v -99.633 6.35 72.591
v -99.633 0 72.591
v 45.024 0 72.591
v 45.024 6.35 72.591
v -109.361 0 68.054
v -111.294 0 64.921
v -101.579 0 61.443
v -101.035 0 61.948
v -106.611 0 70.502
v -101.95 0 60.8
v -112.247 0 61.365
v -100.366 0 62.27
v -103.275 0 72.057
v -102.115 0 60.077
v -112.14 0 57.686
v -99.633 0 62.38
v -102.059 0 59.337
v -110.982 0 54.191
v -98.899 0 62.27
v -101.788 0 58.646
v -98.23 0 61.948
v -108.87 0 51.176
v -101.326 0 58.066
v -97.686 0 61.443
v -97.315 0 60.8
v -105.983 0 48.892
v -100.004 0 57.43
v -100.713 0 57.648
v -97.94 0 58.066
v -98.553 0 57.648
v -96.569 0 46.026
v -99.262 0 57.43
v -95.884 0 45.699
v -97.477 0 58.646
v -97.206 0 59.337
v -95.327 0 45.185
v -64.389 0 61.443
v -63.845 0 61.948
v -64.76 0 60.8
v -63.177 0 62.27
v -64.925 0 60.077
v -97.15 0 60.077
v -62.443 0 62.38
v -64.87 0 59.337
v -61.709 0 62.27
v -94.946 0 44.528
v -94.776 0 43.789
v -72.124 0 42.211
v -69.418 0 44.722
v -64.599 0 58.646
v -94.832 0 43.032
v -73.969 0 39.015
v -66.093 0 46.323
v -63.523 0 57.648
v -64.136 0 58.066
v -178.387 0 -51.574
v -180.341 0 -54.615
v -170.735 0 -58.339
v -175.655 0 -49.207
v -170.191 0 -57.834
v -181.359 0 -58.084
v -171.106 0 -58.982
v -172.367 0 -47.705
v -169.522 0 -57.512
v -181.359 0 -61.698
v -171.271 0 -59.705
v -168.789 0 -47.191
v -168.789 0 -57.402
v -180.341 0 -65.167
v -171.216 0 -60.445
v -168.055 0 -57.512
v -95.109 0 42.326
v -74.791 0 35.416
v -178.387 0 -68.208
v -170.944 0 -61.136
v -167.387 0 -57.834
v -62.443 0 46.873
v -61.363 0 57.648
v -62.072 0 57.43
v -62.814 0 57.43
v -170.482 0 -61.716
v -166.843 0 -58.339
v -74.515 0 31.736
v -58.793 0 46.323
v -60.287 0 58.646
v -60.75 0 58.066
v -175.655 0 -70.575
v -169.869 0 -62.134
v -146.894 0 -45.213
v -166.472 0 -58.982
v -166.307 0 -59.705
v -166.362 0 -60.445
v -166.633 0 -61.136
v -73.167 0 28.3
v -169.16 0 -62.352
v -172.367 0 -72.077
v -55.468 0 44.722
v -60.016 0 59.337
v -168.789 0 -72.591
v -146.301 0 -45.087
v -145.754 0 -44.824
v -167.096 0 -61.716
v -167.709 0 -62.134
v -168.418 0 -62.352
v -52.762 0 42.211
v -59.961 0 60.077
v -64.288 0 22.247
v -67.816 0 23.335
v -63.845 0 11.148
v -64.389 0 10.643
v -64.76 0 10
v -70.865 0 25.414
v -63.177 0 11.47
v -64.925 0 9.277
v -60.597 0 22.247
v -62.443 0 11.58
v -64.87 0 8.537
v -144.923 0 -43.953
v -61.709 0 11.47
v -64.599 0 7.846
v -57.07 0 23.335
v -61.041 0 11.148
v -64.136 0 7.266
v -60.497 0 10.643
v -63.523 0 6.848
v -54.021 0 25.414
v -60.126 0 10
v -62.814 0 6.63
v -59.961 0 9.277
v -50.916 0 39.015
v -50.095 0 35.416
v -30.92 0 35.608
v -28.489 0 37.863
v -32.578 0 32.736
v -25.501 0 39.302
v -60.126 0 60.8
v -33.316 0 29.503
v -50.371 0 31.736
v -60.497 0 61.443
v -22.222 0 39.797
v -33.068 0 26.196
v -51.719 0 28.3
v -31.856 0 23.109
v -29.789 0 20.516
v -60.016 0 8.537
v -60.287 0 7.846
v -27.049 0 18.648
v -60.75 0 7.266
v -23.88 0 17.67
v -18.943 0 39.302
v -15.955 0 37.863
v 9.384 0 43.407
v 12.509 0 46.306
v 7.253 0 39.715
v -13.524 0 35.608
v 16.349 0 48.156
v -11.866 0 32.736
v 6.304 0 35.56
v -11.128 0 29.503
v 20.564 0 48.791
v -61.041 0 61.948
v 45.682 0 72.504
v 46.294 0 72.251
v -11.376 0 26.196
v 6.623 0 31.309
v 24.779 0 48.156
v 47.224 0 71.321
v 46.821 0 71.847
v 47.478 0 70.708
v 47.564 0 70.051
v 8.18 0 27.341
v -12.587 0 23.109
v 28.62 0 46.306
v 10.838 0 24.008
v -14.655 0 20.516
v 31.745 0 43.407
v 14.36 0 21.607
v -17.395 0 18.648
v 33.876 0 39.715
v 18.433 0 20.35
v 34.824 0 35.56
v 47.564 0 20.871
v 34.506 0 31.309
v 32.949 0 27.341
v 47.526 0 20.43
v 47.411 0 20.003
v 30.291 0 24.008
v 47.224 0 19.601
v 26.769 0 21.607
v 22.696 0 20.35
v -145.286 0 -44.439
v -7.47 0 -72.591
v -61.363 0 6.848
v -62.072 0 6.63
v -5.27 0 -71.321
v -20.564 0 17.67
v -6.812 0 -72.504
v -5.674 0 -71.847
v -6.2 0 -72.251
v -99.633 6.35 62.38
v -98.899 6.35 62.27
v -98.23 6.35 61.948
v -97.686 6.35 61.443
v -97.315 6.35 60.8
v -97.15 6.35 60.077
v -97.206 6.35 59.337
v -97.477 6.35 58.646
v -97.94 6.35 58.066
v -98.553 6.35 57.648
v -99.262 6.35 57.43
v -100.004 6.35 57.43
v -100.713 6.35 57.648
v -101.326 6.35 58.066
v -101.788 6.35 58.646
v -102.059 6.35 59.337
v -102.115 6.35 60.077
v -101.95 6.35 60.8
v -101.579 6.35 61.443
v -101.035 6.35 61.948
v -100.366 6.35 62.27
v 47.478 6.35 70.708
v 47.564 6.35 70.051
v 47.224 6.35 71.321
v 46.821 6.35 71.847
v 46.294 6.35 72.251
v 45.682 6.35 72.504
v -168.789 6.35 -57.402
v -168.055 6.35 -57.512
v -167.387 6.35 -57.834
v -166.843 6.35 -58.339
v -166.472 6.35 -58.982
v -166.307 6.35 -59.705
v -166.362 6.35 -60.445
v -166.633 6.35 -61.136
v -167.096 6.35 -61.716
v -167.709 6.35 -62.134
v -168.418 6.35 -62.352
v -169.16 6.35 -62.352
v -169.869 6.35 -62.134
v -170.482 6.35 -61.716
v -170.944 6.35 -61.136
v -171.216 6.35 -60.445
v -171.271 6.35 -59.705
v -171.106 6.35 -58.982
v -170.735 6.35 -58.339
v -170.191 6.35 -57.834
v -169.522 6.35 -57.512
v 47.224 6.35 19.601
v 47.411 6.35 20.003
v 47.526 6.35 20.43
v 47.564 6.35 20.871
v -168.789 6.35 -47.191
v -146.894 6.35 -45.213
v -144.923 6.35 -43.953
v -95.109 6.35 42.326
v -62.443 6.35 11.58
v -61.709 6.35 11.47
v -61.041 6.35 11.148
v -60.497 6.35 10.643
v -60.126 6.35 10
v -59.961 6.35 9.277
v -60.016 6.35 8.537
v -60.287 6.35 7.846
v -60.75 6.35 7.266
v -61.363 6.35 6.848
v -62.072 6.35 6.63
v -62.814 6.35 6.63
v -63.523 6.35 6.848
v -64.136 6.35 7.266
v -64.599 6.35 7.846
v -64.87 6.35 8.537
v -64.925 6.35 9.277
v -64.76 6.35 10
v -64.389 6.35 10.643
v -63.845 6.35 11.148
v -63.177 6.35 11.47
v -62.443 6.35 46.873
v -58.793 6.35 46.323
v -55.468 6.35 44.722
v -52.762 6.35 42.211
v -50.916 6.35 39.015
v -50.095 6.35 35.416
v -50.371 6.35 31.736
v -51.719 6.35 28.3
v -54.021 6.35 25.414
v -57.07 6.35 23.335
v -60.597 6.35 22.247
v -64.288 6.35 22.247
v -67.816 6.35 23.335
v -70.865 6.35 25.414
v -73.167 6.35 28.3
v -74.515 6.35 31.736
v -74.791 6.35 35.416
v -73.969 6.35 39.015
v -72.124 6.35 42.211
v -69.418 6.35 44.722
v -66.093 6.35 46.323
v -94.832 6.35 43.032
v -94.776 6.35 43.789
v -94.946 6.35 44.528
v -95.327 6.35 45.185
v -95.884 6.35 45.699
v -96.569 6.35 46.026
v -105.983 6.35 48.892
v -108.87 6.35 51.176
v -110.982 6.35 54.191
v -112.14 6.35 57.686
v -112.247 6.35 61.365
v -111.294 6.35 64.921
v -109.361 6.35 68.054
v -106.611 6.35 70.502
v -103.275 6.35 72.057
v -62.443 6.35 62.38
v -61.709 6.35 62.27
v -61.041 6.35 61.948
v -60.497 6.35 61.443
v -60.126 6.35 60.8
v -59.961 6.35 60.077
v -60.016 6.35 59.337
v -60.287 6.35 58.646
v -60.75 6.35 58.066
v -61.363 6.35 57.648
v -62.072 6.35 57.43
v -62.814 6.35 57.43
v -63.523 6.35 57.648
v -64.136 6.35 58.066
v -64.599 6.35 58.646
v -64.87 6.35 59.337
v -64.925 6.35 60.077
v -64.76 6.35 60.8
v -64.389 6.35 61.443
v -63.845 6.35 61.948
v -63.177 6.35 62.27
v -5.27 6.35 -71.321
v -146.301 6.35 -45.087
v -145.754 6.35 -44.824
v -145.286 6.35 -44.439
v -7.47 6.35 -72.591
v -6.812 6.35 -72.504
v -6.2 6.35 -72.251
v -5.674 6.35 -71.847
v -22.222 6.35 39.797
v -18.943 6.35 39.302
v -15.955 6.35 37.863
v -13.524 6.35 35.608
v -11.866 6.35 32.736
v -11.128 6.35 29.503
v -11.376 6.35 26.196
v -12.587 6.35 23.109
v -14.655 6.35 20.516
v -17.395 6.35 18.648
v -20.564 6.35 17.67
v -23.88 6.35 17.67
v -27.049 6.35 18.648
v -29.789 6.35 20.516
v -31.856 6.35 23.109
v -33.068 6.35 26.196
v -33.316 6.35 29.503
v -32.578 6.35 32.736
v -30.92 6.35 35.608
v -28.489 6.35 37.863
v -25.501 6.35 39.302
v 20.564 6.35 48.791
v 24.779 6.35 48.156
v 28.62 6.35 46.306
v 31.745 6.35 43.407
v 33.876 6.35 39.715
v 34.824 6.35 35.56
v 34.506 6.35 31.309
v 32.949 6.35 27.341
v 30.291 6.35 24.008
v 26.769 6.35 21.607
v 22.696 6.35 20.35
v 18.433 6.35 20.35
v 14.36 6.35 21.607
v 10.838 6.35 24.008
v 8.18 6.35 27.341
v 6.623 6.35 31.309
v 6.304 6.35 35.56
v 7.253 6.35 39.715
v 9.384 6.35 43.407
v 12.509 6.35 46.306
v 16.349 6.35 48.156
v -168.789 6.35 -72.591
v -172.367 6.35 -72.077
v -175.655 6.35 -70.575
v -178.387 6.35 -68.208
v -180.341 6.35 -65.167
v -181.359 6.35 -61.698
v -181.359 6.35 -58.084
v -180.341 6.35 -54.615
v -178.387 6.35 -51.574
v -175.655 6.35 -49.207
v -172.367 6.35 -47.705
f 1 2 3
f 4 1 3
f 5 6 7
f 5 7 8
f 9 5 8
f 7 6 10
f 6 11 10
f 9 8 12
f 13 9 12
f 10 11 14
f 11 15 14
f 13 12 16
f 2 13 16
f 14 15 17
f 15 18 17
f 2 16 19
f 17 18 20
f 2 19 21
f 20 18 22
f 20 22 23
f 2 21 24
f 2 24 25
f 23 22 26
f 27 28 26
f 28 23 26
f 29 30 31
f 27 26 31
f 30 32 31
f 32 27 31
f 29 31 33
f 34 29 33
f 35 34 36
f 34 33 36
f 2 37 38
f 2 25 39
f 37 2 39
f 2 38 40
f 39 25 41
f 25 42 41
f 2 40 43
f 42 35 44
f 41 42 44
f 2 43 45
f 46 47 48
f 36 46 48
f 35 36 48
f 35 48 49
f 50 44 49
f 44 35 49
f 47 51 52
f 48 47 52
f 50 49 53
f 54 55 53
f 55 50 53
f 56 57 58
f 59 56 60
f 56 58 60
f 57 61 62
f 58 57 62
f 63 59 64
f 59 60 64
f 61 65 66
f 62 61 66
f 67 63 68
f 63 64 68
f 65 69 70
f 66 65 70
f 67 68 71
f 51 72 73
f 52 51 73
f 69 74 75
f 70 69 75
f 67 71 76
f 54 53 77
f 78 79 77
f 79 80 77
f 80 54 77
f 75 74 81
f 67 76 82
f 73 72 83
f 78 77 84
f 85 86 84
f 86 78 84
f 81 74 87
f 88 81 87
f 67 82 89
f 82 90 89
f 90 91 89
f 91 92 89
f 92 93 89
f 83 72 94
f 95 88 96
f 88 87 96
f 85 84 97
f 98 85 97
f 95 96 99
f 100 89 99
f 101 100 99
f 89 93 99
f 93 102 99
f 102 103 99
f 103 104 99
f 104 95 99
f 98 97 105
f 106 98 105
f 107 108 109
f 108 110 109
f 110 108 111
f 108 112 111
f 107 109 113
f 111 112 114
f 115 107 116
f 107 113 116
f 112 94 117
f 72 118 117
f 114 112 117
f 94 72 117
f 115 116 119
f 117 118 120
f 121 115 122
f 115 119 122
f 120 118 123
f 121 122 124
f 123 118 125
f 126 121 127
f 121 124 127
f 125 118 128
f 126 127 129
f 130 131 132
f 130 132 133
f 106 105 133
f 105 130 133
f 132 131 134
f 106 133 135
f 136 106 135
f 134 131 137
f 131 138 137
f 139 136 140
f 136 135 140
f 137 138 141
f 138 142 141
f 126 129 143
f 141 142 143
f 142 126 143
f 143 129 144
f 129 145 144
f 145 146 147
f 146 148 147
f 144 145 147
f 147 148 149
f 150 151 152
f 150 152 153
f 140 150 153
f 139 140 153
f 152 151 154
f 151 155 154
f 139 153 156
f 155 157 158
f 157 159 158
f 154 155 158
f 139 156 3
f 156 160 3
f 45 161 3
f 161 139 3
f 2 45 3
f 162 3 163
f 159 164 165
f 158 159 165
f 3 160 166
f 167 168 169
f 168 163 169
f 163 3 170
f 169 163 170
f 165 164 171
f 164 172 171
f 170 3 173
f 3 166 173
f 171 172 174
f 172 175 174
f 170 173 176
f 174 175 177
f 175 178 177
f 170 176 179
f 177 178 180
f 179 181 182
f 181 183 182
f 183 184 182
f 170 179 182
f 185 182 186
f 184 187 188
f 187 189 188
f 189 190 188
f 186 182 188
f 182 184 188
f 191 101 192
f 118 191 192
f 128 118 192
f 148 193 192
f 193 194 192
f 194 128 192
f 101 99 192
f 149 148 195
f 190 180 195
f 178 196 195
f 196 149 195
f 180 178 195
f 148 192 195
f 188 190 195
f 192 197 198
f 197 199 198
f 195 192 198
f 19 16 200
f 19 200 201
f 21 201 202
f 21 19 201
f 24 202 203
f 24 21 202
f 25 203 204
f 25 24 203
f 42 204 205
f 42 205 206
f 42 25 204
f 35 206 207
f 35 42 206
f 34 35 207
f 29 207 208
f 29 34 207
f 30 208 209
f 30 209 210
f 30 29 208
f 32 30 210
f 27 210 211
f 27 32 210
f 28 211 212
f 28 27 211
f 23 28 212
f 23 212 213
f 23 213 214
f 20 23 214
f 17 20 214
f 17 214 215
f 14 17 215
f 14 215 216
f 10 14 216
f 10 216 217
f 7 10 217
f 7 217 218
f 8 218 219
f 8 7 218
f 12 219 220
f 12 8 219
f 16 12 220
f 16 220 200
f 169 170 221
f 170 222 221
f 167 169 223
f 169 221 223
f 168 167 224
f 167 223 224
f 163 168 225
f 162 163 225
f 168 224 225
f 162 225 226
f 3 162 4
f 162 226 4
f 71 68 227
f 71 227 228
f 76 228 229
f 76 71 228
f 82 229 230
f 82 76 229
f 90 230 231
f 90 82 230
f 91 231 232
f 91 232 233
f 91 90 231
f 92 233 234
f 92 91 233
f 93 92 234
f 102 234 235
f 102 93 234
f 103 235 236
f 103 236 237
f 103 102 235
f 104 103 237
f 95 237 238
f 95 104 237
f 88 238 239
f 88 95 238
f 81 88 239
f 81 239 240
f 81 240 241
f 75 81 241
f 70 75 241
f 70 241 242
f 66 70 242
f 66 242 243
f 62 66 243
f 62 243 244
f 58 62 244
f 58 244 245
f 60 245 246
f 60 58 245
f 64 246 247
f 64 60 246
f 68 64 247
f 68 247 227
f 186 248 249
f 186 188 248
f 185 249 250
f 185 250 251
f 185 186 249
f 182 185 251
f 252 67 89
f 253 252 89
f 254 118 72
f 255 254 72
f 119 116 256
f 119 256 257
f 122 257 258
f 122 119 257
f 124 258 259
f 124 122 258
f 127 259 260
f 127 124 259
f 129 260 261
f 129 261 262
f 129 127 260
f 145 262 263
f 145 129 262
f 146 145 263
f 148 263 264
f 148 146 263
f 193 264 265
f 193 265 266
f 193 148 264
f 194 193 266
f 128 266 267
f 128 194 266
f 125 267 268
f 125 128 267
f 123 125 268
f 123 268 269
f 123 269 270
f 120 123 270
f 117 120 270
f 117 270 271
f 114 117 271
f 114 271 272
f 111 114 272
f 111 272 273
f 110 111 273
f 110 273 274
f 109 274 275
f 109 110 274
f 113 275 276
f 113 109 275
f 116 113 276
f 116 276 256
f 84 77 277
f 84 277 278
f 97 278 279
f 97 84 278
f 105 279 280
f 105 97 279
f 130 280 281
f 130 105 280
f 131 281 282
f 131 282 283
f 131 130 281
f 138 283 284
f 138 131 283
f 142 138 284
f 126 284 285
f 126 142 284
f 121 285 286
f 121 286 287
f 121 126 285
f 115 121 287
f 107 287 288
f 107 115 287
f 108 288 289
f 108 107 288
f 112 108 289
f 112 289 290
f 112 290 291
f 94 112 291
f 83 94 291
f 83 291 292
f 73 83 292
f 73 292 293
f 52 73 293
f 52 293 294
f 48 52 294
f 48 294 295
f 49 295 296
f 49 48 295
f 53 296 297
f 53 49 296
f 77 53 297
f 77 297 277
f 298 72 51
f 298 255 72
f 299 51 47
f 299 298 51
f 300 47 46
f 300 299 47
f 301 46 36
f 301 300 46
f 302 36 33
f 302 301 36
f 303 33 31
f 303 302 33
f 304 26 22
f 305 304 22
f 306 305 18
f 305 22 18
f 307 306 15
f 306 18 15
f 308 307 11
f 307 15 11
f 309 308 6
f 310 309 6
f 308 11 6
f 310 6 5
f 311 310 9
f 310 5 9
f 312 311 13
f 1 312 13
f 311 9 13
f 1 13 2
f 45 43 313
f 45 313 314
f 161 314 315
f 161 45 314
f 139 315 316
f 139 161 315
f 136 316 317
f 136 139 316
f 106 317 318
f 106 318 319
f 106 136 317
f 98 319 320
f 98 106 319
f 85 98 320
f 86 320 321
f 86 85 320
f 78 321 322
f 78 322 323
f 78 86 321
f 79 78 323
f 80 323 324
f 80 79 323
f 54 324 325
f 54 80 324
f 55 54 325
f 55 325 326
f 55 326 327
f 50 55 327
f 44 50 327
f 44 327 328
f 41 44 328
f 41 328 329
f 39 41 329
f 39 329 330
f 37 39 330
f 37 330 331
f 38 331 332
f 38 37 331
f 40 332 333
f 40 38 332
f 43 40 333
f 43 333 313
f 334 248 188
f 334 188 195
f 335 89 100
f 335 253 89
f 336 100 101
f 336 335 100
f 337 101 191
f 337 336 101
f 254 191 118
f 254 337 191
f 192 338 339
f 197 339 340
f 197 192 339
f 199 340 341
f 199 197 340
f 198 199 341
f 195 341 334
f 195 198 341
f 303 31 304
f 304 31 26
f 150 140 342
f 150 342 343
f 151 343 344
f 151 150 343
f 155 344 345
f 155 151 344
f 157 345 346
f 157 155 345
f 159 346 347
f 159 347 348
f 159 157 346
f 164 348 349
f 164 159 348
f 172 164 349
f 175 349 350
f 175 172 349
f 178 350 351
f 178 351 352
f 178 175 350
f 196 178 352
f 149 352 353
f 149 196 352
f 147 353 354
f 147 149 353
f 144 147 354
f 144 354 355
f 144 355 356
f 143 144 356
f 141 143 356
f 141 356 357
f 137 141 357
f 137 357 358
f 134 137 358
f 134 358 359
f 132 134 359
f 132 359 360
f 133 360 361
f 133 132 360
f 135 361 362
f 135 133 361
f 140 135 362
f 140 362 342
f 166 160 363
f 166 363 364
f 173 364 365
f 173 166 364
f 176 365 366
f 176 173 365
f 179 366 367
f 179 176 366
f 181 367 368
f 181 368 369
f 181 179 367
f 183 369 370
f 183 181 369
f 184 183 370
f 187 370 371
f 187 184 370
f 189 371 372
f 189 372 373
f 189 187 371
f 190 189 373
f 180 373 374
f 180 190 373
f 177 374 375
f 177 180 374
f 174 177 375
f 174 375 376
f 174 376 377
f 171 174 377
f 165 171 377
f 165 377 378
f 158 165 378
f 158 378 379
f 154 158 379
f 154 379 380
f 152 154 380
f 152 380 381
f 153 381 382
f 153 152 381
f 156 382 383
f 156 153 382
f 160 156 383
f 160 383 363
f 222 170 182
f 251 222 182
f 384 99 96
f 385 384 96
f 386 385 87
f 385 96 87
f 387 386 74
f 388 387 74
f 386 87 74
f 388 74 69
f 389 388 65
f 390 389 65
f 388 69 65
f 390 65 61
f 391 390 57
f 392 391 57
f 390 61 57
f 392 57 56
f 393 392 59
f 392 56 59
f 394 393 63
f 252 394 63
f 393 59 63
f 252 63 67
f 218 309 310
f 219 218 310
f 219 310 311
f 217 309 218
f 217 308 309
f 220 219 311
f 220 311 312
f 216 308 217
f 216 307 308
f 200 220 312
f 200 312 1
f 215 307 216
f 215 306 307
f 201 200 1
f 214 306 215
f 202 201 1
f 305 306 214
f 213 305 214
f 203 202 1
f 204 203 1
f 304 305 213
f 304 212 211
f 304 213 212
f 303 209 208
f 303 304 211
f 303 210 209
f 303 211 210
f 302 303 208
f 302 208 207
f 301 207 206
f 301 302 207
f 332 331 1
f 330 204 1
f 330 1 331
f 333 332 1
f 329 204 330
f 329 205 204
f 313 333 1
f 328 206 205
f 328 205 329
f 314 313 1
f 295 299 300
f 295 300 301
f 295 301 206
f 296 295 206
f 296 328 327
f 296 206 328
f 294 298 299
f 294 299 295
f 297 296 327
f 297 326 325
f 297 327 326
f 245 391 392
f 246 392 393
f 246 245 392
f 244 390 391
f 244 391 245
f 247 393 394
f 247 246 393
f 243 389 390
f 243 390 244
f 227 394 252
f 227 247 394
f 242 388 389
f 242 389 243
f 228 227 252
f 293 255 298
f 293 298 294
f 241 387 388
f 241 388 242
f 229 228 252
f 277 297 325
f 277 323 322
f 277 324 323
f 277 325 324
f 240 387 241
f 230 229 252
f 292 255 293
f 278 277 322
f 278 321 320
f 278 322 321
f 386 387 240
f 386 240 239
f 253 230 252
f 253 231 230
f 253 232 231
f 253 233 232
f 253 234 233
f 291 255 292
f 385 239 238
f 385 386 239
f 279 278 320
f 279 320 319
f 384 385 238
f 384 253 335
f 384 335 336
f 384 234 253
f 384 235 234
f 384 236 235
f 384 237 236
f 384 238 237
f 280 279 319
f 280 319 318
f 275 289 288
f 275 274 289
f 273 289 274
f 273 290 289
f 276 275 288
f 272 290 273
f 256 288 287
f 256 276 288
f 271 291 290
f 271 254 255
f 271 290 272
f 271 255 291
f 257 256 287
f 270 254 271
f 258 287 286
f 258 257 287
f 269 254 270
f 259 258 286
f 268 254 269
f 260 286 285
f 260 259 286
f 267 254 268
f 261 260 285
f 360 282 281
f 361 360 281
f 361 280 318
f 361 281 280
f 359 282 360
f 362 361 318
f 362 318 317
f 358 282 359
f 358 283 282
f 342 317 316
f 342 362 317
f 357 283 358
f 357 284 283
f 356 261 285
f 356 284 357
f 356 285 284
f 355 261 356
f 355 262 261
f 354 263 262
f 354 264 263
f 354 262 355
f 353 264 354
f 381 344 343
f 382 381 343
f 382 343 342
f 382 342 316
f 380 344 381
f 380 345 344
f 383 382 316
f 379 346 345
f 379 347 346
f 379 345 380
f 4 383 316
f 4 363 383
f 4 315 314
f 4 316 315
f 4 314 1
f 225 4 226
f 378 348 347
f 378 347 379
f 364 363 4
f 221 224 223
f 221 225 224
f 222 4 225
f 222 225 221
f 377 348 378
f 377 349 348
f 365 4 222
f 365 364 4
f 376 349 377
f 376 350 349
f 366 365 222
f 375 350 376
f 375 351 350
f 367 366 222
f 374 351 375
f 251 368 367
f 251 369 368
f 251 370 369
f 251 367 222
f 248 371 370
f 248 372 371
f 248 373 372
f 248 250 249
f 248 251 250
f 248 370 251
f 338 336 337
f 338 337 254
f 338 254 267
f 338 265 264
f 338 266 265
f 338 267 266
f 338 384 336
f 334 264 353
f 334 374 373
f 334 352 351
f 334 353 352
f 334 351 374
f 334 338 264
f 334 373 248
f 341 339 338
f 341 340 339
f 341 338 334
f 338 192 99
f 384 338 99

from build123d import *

# Parameters (mm, degrees)
SKETCH1_R           = 2.4892
SKETCH1_R_2         = 14.3002
SKETCH1_R_3         = 11.1252
SKETCH1_R_4         = 12.3825
BOSS_EXTRUDE1_DEPTH = 6.35
CUT_EXTRUDE3_DEPTH  = 196.570791382
FILLET2_R           = 2.54


with BuildPart() as part:
    # Sketch1 → Boss-Extrude1 (new body)
    with BuildSketch(Plane(origin=(0, 0, 0), x_dir=(1, 0, 0), z_dir=(0, 1, 0))):
        with BuildLine():
            ThreePointArc((-168.788743889, 72.590962133), (-181.488743889, 59.890962122), (-168.788743866, 47.190962133))
            Line((-168.788743866, 47.190962133), (-145.58139547, 45.094655563))
            Line((-145.58139547, 45.094655563), (-93.510572414, -45.094655563))
            Line((-93.510572414, -45.094655563), (-105.98261767, -48.892439505))
            ThreePointArc((-105.98261767, -48.892439505), (-111.899875664, -63.177964006), (-99.63261767, -72.590962133))
            Line((-99.63261767, -72.590962133), (47.56445351, -72.590962133))
            Line((47.56445351, -72.590962133), (47.56445351, 72.590962133))
            Line((47.56445351, 72.590962133), (-168.788743889, 72.590962133))
        make_face()
        with Locations(Location((-168.788743889, 59.890962133, 0), (0, 0, 270))):
            Circle(SKETCH1_R, mode=Mode.SUBTRACT)
        with Locations(Location((20.56425351, -34.490962133, 0), (0, 0, 270))):
            Circle(SKETCH1_R_2, mode=Mode.SUBTRACT)
        with Locations(Location((-22.22178223, -28.671379192, 0), (0, 0, 270))):
            Circle(SKETCH1_R_3, mode=Mode.SUBTRACT)
        with Locations(Location((-62.44294649, -9.090962133, 0), (0, 0, 270))):
            Circle(SKETCH1_R, mode=Mode.SUBTRACT)
        with Locations(Location((-62.44294649, -34.490962133, 0), (0, 0, 270))):
            Circle(SKETCH1_R_4, mode=Mode.SUBTRACT)
        with Locations(Location((-62.44294649, -59.890962133, 0), (0, 0, 270))):
            Circle(SKETCH1_R, mode=Mode.SUBTRACT)
        with Locations(Location((-99.63261767, -59.890962133, 0), (0, 0, 270))):
            Circle(SKETCH1_R, mode=Mode.SUBTRACT)
    extrude(amount=BOSS_EXTRUDE1_DEPTH)

    # Sketch3 → Cut-Extrude3 (cut, through all)
    with BuildSketch(Plane(origin=(0, 6.35, 0), x_dir=(1, 0, 0), z_dir=(0, 1, 0))):
        Polygon((47.56445351, -20.190762133), (-6.003099971, 72.590962133), (47.56445351, 72.590962133), align=None)
    extrude(amount=-CUT_EXTRUDE3_DEPTH, mode=Mode.SUBTRACT)

    # Fillet2
    fillet2_edges = [part.edges().sort_by_distance(p)[0] for p in [
        (-93.510572414, 3.175, 45.094655563),
        (-145.58139547, 3.175, -45.094655563),
        (47.56445351, 3.175, 72.590962133),
        (47.56445351, 3.175, 20.190762133),
        (-6.003099971, 3.175, -72.590962133),
    ]]
    fillet(fillet2_edges, radius=FILLET2_R)


solid = part.part
